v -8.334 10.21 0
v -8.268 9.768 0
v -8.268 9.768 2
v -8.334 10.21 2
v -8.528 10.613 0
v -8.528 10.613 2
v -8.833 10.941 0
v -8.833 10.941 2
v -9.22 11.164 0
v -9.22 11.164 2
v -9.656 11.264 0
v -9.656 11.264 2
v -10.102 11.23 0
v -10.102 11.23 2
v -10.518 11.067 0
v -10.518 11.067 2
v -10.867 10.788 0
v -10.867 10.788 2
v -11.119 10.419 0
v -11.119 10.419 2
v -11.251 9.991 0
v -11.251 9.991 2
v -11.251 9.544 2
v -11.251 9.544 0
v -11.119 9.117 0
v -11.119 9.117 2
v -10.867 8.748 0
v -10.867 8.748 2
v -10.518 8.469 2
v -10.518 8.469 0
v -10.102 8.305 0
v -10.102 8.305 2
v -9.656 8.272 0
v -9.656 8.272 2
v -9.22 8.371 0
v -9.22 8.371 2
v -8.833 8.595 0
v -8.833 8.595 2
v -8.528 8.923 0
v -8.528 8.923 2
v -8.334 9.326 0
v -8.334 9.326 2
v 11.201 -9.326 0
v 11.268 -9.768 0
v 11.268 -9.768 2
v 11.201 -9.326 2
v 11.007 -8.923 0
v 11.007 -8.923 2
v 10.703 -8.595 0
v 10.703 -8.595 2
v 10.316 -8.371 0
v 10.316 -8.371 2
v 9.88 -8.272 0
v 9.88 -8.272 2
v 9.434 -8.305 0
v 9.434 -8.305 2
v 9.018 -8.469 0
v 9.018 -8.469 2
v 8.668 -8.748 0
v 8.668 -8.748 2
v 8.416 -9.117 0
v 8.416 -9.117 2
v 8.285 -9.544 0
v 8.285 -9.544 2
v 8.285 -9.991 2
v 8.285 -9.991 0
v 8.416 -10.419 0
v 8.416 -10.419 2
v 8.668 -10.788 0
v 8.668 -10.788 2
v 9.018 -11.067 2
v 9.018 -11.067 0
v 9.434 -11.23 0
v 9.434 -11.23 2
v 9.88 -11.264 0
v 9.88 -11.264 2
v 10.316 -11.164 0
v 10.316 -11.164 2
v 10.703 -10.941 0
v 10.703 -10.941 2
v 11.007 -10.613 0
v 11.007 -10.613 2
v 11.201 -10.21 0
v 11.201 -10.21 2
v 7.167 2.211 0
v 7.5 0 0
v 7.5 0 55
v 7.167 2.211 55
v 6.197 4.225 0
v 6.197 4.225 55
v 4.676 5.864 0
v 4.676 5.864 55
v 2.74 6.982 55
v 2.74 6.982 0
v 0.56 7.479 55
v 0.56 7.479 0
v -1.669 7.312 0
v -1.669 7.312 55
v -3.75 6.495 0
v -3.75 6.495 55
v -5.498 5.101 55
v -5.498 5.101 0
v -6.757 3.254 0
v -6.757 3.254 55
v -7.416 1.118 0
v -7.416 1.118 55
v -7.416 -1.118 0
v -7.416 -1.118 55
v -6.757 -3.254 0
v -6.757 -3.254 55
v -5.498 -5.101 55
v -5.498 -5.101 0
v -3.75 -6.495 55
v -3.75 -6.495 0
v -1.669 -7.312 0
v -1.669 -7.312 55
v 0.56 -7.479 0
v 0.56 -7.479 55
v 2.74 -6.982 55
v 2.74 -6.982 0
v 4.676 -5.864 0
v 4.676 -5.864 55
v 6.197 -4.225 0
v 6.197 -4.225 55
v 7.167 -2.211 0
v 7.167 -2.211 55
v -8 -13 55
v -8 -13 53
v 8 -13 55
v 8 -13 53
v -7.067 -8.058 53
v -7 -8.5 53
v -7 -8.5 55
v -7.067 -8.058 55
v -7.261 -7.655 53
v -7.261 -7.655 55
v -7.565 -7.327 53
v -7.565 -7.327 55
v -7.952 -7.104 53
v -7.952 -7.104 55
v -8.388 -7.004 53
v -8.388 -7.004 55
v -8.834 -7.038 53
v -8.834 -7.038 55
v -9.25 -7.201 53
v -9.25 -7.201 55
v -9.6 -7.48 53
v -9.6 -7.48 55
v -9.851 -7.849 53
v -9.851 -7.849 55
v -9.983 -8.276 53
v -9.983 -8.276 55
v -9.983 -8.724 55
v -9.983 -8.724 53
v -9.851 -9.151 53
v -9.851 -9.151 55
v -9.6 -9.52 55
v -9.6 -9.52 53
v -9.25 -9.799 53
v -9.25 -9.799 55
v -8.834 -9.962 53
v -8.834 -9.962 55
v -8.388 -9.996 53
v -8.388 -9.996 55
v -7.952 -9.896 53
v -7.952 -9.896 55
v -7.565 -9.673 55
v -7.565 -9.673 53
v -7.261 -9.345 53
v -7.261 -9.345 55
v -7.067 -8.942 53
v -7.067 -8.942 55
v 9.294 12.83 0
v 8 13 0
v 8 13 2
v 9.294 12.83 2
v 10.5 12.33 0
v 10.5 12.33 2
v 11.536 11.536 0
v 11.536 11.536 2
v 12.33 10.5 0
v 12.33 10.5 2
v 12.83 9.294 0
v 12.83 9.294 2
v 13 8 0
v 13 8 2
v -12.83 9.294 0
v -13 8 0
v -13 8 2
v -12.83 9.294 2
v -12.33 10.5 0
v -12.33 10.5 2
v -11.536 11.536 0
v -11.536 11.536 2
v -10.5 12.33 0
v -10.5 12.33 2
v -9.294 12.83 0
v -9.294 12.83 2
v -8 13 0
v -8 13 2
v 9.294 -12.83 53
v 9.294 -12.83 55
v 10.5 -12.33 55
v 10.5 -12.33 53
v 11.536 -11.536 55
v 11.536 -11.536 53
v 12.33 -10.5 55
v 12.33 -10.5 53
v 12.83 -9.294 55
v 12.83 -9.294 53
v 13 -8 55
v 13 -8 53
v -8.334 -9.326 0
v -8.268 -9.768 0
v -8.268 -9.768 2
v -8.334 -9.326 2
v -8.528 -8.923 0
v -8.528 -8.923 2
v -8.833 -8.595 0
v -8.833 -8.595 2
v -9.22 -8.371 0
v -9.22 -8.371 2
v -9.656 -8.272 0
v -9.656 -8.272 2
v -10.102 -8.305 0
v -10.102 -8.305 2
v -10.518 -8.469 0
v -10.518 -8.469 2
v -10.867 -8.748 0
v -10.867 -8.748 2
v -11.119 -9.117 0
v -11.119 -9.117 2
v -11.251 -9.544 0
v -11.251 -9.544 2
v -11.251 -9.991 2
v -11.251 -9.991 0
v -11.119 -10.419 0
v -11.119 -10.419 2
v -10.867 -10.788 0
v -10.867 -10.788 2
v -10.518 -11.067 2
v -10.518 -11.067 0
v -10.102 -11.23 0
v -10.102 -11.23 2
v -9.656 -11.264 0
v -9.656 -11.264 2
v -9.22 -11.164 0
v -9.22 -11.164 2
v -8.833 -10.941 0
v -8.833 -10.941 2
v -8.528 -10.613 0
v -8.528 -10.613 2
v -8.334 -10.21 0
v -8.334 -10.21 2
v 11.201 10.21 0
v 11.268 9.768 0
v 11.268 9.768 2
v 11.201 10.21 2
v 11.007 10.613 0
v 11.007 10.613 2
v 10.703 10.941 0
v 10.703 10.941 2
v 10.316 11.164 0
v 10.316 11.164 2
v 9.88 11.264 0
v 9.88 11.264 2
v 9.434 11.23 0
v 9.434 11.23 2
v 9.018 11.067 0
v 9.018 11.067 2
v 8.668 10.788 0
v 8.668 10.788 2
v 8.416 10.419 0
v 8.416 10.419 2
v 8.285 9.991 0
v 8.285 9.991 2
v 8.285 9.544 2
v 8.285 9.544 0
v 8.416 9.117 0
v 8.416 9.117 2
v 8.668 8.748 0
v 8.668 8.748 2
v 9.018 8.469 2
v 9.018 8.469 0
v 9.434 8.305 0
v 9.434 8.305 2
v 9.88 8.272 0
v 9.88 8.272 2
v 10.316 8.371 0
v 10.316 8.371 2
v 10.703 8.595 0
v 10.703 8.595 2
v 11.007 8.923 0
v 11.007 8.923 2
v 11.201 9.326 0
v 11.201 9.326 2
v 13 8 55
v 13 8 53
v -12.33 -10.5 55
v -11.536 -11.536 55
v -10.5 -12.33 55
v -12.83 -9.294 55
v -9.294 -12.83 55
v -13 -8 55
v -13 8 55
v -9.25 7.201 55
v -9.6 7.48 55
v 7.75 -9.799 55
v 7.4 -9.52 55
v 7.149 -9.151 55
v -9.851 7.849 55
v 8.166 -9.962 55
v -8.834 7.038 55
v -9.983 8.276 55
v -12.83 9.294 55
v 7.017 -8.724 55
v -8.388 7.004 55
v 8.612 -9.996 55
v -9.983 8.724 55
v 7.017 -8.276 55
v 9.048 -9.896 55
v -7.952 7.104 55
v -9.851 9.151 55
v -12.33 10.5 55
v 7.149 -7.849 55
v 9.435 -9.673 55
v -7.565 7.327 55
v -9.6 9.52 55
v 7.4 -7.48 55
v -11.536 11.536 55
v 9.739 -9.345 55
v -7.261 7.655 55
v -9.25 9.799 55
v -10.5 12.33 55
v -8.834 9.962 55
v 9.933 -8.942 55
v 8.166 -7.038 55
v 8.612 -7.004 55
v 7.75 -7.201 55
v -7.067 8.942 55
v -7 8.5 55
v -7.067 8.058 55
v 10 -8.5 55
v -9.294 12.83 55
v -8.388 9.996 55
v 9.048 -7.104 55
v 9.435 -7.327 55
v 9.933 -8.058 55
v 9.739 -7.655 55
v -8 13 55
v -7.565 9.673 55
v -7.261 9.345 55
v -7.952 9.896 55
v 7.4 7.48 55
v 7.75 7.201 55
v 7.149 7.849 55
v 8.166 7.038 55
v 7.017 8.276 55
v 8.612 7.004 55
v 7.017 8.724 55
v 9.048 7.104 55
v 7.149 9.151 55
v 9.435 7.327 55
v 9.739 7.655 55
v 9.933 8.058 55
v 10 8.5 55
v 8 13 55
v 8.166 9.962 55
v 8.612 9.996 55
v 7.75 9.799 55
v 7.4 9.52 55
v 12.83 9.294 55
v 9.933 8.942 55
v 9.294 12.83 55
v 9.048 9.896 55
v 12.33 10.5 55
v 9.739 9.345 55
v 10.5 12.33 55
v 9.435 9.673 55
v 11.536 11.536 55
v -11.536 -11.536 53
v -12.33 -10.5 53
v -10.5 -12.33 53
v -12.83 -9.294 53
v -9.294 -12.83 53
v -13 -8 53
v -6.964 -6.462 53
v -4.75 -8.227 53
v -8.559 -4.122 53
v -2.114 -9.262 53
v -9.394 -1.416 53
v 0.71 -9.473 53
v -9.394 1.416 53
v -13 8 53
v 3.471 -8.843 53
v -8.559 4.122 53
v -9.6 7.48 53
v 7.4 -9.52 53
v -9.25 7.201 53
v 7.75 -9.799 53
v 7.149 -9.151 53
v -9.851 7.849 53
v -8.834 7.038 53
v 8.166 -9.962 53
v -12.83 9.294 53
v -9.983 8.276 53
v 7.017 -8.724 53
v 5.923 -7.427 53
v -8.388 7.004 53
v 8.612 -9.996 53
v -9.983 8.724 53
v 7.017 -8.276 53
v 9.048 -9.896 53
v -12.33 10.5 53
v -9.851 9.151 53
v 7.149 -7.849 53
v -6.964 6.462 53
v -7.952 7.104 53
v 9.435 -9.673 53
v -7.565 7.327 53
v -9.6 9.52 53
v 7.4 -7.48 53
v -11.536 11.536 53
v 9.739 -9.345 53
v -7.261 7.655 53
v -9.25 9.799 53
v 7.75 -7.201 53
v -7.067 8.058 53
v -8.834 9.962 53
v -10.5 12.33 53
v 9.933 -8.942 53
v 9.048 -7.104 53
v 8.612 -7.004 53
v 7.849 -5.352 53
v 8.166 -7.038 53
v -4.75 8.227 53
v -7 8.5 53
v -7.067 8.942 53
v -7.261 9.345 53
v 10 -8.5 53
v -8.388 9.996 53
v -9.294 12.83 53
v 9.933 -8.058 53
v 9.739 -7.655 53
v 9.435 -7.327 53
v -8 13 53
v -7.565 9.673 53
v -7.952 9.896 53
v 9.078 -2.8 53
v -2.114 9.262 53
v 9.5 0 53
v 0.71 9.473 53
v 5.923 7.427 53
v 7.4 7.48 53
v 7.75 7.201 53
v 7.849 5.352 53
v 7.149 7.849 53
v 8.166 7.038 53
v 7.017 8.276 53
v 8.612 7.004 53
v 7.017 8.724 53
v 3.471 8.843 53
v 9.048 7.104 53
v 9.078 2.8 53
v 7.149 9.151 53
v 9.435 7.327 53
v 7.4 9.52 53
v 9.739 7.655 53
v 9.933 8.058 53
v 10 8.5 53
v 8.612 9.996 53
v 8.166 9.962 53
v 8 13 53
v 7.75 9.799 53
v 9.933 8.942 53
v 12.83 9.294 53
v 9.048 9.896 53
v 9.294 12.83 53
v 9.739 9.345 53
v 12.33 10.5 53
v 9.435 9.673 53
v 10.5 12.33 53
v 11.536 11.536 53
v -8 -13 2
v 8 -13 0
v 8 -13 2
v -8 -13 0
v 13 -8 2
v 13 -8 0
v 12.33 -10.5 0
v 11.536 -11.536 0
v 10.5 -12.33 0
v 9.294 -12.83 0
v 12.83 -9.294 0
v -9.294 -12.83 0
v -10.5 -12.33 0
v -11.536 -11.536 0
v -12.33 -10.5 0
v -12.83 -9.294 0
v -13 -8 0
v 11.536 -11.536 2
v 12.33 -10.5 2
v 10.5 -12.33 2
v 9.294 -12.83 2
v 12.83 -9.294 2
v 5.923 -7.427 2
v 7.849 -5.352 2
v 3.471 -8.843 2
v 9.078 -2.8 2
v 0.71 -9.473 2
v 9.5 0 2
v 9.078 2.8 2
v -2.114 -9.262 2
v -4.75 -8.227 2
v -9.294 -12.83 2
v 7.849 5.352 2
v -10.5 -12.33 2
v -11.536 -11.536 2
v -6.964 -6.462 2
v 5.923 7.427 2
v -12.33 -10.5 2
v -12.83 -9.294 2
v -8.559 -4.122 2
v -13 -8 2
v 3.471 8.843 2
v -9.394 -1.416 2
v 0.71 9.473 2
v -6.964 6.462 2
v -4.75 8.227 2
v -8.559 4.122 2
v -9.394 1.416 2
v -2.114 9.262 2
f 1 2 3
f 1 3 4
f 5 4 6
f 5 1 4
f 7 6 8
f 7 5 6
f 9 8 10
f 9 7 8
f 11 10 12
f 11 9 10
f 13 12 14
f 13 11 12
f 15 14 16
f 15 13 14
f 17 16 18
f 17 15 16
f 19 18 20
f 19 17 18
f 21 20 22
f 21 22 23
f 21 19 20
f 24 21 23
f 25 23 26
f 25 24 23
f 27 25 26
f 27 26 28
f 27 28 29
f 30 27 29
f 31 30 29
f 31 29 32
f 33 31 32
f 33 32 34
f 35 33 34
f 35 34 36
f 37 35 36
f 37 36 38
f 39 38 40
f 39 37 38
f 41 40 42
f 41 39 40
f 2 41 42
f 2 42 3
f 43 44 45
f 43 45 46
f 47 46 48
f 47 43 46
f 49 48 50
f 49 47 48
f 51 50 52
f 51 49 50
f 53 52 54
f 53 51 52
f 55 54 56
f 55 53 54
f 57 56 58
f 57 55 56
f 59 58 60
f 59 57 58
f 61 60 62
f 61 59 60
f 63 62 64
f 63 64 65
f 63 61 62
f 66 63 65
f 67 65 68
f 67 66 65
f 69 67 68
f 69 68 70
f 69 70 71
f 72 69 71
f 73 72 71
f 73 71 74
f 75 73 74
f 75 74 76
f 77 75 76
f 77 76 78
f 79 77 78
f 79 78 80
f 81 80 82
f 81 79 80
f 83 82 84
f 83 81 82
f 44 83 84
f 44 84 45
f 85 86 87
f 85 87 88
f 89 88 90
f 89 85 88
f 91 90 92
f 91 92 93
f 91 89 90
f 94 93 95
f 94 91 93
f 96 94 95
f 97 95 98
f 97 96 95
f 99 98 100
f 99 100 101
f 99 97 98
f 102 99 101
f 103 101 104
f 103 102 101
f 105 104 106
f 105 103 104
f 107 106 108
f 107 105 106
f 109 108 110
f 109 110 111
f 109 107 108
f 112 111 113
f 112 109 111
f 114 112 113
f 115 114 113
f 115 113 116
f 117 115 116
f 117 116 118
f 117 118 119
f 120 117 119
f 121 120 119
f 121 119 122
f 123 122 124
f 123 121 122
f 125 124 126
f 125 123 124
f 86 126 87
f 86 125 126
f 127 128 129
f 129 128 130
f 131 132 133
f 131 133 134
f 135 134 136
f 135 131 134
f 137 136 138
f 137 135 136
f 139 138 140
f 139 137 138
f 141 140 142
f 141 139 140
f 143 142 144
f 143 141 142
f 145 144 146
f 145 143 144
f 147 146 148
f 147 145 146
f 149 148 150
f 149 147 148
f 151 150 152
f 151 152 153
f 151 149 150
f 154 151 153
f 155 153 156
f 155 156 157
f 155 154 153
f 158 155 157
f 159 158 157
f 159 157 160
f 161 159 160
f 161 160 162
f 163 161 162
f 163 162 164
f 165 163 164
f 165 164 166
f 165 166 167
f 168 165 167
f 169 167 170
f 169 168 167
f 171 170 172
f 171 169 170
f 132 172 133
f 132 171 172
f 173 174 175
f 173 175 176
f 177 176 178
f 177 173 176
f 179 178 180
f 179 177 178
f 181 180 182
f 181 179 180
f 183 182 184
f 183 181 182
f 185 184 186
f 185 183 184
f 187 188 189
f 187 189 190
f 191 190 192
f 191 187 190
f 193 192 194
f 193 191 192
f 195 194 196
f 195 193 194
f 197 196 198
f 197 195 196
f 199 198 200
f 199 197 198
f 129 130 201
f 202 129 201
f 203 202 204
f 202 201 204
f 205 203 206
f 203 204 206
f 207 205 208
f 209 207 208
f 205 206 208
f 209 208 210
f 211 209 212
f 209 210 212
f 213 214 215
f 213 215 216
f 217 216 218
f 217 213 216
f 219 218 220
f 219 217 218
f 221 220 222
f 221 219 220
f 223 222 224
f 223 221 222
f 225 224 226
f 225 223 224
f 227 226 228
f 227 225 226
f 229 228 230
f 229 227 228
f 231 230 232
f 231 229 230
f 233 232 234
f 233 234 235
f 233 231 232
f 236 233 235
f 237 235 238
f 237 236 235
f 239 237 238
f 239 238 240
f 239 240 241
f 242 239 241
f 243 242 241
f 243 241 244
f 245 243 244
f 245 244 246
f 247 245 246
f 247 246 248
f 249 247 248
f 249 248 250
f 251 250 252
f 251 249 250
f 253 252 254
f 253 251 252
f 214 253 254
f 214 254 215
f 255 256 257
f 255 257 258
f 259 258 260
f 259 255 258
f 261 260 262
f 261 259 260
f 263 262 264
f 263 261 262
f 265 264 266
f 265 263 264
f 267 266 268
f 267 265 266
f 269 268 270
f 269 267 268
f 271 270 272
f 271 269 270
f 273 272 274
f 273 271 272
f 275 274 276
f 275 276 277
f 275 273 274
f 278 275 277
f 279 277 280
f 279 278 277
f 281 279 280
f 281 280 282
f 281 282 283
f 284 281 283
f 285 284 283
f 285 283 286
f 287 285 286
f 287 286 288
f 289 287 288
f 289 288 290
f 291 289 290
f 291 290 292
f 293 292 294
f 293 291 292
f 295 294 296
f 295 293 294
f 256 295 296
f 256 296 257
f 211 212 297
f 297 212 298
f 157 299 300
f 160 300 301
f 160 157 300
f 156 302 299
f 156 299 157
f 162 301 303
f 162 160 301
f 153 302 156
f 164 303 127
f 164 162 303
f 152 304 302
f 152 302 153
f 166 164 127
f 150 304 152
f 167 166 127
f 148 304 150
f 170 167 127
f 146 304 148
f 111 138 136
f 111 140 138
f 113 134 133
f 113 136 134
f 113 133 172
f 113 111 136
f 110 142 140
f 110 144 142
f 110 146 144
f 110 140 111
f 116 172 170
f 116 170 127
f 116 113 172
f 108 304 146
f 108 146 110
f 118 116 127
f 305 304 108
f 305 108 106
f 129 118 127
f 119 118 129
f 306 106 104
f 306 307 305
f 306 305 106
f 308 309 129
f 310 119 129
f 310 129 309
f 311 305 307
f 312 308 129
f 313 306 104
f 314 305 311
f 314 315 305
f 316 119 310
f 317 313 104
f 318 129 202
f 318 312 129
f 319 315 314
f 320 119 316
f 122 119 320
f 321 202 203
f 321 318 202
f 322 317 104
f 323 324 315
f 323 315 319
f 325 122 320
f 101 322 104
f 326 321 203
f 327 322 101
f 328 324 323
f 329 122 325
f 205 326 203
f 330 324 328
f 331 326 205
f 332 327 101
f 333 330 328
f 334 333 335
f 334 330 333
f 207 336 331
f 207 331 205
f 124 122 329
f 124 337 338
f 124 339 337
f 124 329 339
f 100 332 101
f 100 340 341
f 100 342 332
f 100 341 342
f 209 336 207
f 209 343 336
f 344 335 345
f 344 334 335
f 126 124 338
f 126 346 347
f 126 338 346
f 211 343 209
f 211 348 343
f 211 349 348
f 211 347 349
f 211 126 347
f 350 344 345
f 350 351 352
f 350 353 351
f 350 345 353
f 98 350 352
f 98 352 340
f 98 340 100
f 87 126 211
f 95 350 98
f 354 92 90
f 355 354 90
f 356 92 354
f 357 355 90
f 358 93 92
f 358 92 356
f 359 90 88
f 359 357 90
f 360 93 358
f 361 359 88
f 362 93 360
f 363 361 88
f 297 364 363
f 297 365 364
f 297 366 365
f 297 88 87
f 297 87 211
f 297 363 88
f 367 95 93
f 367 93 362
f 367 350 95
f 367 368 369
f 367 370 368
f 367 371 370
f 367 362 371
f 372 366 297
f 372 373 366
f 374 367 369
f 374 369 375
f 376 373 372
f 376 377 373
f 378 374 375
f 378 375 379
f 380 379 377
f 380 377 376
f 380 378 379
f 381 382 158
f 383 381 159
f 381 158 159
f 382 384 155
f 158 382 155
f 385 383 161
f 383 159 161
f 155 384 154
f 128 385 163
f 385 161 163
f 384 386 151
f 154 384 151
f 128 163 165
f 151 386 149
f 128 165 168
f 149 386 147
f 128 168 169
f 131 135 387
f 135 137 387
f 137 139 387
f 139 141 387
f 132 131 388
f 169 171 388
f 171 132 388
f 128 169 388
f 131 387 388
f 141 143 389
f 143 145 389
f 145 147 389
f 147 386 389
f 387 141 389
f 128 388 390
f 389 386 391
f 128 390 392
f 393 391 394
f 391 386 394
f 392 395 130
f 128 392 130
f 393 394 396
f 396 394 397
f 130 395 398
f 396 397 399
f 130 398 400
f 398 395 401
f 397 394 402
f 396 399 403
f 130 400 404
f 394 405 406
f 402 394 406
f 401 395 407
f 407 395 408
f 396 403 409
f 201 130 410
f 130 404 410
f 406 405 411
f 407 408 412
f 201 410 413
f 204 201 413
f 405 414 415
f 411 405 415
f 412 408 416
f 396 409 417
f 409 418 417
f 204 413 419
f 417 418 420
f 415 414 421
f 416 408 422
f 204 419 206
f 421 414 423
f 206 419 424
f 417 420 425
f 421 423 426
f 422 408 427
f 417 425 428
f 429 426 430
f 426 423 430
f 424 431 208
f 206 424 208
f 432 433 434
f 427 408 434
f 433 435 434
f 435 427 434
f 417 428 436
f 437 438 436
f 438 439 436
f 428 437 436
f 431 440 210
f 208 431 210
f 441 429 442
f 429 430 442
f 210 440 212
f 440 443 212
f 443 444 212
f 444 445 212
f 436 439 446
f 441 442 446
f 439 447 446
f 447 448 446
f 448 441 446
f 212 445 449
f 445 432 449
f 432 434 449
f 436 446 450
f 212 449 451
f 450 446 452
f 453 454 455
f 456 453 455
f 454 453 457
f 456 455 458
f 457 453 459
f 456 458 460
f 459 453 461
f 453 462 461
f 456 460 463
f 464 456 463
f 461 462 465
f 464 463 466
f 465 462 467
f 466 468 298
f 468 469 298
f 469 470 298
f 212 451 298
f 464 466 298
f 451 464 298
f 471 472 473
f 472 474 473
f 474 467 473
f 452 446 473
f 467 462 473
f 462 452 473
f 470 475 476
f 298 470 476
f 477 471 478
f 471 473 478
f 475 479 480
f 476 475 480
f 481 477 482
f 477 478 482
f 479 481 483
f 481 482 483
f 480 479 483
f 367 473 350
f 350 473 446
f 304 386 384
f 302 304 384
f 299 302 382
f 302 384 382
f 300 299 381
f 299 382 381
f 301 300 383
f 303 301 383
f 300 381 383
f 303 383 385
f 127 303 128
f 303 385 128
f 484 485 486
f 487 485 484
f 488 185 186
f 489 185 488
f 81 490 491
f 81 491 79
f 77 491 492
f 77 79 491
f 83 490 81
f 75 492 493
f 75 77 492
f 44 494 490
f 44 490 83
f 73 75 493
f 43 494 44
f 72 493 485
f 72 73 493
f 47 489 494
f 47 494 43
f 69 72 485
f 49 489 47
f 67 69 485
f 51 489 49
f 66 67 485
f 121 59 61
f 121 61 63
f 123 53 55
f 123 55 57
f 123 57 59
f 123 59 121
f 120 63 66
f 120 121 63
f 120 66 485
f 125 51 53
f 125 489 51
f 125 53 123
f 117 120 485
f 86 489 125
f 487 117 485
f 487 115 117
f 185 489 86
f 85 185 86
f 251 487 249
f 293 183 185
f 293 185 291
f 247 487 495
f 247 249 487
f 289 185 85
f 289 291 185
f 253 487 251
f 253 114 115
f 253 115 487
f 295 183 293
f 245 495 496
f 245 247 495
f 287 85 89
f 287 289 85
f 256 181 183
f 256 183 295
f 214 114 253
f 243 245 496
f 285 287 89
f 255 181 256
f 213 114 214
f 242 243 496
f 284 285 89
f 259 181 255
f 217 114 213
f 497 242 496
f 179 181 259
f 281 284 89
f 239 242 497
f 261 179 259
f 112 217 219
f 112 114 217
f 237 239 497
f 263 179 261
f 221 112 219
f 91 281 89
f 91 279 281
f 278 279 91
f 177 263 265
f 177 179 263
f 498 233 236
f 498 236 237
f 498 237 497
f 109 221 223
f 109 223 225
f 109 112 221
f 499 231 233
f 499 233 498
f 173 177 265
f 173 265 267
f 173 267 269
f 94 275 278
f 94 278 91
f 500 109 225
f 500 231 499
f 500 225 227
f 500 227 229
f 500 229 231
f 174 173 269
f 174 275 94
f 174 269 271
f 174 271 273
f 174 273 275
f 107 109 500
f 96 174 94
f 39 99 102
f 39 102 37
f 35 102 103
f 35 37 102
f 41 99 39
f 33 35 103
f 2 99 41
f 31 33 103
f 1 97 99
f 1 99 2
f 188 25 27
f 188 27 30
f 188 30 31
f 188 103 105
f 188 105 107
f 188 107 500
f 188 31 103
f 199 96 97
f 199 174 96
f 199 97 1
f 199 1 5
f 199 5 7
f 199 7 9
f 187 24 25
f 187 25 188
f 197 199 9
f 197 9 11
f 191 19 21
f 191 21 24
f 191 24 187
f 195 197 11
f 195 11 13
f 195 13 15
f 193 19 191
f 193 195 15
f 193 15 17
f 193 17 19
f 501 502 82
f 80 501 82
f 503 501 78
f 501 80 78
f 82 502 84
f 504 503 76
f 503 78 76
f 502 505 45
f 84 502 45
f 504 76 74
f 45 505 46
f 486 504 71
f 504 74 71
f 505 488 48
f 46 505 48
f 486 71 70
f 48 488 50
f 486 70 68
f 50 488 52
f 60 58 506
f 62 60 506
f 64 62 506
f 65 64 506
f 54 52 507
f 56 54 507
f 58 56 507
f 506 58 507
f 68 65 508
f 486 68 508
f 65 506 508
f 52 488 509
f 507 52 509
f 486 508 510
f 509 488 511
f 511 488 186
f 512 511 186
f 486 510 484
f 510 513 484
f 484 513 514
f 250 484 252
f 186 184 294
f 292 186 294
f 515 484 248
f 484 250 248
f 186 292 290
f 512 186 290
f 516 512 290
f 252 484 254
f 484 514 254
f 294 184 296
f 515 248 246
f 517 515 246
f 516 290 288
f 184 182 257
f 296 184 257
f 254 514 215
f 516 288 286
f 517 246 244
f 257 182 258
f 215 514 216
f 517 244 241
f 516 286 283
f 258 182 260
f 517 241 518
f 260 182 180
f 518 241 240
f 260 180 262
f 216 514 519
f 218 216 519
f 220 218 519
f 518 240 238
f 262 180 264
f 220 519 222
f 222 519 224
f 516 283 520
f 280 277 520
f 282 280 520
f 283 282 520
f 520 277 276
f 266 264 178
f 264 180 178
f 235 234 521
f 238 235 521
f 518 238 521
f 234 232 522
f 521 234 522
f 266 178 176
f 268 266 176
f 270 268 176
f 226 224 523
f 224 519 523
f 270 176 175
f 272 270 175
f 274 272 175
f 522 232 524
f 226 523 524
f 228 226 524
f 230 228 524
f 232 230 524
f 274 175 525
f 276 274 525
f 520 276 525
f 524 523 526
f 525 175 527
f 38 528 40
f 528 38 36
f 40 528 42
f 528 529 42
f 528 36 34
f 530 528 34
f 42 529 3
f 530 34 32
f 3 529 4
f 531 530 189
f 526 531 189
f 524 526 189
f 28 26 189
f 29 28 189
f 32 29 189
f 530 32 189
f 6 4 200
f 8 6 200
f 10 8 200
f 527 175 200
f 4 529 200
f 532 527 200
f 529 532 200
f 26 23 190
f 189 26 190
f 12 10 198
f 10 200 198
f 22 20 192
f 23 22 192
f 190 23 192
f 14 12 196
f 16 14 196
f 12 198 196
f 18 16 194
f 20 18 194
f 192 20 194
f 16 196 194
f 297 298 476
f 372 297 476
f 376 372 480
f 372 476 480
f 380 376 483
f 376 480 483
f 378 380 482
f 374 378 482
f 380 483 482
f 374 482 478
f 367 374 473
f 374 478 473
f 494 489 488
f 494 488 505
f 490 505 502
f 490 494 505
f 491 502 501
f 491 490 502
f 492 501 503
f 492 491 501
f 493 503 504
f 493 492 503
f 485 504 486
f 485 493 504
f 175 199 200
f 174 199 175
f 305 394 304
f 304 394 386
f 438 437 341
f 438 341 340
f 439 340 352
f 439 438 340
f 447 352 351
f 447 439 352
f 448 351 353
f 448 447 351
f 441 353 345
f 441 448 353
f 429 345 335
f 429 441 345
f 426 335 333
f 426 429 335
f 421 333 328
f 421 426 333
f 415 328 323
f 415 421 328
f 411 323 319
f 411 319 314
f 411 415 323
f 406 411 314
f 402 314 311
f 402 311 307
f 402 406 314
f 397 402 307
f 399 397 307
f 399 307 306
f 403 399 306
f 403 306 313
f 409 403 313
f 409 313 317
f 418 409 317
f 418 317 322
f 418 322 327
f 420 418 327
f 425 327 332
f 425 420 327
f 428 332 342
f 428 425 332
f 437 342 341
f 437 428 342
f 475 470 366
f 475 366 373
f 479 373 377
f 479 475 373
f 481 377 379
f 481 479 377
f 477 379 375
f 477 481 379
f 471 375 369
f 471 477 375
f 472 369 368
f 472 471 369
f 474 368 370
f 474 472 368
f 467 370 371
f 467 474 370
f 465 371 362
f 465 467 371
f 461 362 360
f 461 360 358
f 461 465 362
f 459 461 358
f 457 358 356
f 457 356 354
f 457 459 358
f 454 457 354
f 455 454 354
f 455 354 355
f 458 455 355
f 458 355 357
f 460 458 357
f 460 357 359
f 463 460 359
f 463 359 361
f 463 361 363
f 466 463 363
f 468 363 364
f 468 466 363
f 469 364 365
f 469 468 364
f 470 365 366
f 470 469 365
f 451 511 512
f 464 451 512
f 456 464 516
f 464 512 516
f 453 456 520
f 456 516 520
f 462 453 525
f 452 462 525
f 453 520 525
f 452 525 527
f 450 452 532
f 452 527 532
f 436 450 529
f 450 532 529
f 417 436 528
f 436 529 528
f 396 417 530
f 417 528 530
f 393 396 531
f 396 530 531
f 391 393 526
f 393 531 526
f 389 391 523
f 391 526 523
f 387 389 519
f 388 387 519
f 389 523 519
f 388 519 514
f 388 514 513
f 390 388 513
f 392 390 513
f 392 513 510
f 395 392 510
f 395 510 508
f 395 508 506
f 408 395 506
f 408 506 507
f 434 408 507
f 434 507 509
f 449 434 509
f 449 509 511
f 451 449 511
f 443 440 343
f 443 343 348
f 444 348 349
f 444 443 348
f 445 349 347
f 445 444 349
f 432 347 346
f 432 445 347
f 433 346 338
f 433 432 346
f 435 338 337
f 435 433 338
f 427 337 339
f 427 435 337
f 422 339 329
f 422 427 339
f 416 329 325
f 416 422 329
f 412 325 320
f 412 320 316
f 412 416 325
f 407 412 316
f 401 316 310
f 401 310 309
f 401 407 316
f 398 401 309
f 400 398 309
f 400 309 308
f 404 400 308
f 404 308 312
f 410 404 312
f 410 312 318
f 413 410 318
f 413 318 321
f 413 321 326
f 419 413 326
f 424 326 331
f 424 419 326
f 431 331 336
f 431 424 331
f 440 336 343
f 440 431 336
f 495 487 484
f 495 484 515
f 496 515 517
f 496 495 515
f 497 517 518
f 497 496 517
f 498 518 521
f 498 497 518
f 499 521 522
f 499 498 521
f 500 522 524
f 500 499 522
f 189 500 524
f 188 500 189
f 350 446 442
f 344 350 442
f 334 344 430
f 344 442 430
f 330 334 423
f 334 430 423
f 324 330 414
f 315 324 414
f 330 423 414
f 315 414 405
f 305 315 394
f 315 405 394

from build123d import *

# Parameters (mm, degrees)
SKETCH_1_R      = 1.5
SKETCH_1_R_2    = 9.5
EXTRUDE_1_DEPTH = 2
SKETCH_1_6_R    = 9.5
SKETCH_1_6_R_2  = 7.5
EXTRUDE_2_DEPTH = 55
EXTRUDE_START   = -2
SKETCH_5_R      = 1.5
SKETCH_5_R_2    = 9.5
EXTRUDE_3_DEPTH = 2


with BuildPart() as part:
    # 草图1 → 凸台-拉伸1 (new body)
    with BuildSketch(Plane.XY):
        with BuildLine():
            Line((8, 13), (-8, 13))
            ThreePointArc((-8, 13), (-11.535533906, 11.535533906), (-13, 8))
            Line((-13, 8), (-13, -8))
            ThreePointArc((-13, -8), (-11.535533906, -11.535533906), (-8, -13))
            Line((-8, -13), (8, -13))
            ThreePointArc((8, -13), (11.535533906, -11.535533906), (13, -8))
            Line((13, -8), (13, 8))
            ThreePointArc((13, 8), (11.535533906, 11.535533906), (8, 13))
        make_face()
        with Locations((-9.767766953, -9.767766953)):
            Circle(SKETCH_1_R, mode=Mode.SUBTRACT)
        with Locations((9.767766953, -9.767766953)):
            Circle(SKETCH_1_R, mode=Mode.SUBTRACT)
        with Locations((-9.767766953, 9.767766953)):
            Circle(SKETCH_1_R, mode=Mode.SUBTRACT)
        Circle(SKETCH_1_R_2, mode=Mode.SUBTRACT)
        with Locations((9.767766953, 9.767766953)):
            Circle(SKETCH_1_R, mode=Mode.SUBTRACT)
    extrude(amount=EXTRUDE_1_DEPTH)

    # 草图1<6> → 凸台-拉伸2 (add)
    with BuildSketch(Plane.XY):
        Circle(SKETCH_1_6_R)
        Circle(SKETCH_1_6_R_2, mode=Mode.SUBTRACT)
    extrude(amount=EXTRUDE_2_DEPTH)

    # 草图5 → 凸台-拉伸3 (add)
    with BuildSketch(Plane.XY.offset(55).offset(EXTRUDE_START)):
        with BuildLine():
            Line((8, 13), (-8, 13))
            ThreePointArc((-8, 13), (-11.535533906, 11.535533906), (-13, 8))
            Line((-13, 8), (-13, -8))
            ThreePointArc((-13, -8), (-11.535533906, -11.535533906), (-8, -13))
            Line((-8, -13), (8, -13))
            ThreePointArc((8, -13), (11.535533906, -11.535533906), (13, -8))
            Line((13, -8), (13, 8))
            ThreePointArc((13, 8), (11.535533906, 11.535533906), (8, 13))
        make_face()
        with Locations((-8.5, -8.5)):
            Circle(SKETCH_5_R, mode=Mode.SUBTRACT)
        with Locations((8.5, -8.5)):
            Circle(SKETCH_5_R, mode=Mode.SUBTRACT)
        Circle(SKETCH_5_R_2, mode=Mode.SUBTRACT)
        with Locations((-8.5, 8.5)):
            Circle(SKETCH_5_R, mode=Mode.SUBTRACT)
        with Locations((8.5, 8.5)):
            Circle(SKETCH_5_R, mode=Mode.SUBTRACT)
    extrude(amount=EXTRUDE_3_DEPTH)


solid = part.part
